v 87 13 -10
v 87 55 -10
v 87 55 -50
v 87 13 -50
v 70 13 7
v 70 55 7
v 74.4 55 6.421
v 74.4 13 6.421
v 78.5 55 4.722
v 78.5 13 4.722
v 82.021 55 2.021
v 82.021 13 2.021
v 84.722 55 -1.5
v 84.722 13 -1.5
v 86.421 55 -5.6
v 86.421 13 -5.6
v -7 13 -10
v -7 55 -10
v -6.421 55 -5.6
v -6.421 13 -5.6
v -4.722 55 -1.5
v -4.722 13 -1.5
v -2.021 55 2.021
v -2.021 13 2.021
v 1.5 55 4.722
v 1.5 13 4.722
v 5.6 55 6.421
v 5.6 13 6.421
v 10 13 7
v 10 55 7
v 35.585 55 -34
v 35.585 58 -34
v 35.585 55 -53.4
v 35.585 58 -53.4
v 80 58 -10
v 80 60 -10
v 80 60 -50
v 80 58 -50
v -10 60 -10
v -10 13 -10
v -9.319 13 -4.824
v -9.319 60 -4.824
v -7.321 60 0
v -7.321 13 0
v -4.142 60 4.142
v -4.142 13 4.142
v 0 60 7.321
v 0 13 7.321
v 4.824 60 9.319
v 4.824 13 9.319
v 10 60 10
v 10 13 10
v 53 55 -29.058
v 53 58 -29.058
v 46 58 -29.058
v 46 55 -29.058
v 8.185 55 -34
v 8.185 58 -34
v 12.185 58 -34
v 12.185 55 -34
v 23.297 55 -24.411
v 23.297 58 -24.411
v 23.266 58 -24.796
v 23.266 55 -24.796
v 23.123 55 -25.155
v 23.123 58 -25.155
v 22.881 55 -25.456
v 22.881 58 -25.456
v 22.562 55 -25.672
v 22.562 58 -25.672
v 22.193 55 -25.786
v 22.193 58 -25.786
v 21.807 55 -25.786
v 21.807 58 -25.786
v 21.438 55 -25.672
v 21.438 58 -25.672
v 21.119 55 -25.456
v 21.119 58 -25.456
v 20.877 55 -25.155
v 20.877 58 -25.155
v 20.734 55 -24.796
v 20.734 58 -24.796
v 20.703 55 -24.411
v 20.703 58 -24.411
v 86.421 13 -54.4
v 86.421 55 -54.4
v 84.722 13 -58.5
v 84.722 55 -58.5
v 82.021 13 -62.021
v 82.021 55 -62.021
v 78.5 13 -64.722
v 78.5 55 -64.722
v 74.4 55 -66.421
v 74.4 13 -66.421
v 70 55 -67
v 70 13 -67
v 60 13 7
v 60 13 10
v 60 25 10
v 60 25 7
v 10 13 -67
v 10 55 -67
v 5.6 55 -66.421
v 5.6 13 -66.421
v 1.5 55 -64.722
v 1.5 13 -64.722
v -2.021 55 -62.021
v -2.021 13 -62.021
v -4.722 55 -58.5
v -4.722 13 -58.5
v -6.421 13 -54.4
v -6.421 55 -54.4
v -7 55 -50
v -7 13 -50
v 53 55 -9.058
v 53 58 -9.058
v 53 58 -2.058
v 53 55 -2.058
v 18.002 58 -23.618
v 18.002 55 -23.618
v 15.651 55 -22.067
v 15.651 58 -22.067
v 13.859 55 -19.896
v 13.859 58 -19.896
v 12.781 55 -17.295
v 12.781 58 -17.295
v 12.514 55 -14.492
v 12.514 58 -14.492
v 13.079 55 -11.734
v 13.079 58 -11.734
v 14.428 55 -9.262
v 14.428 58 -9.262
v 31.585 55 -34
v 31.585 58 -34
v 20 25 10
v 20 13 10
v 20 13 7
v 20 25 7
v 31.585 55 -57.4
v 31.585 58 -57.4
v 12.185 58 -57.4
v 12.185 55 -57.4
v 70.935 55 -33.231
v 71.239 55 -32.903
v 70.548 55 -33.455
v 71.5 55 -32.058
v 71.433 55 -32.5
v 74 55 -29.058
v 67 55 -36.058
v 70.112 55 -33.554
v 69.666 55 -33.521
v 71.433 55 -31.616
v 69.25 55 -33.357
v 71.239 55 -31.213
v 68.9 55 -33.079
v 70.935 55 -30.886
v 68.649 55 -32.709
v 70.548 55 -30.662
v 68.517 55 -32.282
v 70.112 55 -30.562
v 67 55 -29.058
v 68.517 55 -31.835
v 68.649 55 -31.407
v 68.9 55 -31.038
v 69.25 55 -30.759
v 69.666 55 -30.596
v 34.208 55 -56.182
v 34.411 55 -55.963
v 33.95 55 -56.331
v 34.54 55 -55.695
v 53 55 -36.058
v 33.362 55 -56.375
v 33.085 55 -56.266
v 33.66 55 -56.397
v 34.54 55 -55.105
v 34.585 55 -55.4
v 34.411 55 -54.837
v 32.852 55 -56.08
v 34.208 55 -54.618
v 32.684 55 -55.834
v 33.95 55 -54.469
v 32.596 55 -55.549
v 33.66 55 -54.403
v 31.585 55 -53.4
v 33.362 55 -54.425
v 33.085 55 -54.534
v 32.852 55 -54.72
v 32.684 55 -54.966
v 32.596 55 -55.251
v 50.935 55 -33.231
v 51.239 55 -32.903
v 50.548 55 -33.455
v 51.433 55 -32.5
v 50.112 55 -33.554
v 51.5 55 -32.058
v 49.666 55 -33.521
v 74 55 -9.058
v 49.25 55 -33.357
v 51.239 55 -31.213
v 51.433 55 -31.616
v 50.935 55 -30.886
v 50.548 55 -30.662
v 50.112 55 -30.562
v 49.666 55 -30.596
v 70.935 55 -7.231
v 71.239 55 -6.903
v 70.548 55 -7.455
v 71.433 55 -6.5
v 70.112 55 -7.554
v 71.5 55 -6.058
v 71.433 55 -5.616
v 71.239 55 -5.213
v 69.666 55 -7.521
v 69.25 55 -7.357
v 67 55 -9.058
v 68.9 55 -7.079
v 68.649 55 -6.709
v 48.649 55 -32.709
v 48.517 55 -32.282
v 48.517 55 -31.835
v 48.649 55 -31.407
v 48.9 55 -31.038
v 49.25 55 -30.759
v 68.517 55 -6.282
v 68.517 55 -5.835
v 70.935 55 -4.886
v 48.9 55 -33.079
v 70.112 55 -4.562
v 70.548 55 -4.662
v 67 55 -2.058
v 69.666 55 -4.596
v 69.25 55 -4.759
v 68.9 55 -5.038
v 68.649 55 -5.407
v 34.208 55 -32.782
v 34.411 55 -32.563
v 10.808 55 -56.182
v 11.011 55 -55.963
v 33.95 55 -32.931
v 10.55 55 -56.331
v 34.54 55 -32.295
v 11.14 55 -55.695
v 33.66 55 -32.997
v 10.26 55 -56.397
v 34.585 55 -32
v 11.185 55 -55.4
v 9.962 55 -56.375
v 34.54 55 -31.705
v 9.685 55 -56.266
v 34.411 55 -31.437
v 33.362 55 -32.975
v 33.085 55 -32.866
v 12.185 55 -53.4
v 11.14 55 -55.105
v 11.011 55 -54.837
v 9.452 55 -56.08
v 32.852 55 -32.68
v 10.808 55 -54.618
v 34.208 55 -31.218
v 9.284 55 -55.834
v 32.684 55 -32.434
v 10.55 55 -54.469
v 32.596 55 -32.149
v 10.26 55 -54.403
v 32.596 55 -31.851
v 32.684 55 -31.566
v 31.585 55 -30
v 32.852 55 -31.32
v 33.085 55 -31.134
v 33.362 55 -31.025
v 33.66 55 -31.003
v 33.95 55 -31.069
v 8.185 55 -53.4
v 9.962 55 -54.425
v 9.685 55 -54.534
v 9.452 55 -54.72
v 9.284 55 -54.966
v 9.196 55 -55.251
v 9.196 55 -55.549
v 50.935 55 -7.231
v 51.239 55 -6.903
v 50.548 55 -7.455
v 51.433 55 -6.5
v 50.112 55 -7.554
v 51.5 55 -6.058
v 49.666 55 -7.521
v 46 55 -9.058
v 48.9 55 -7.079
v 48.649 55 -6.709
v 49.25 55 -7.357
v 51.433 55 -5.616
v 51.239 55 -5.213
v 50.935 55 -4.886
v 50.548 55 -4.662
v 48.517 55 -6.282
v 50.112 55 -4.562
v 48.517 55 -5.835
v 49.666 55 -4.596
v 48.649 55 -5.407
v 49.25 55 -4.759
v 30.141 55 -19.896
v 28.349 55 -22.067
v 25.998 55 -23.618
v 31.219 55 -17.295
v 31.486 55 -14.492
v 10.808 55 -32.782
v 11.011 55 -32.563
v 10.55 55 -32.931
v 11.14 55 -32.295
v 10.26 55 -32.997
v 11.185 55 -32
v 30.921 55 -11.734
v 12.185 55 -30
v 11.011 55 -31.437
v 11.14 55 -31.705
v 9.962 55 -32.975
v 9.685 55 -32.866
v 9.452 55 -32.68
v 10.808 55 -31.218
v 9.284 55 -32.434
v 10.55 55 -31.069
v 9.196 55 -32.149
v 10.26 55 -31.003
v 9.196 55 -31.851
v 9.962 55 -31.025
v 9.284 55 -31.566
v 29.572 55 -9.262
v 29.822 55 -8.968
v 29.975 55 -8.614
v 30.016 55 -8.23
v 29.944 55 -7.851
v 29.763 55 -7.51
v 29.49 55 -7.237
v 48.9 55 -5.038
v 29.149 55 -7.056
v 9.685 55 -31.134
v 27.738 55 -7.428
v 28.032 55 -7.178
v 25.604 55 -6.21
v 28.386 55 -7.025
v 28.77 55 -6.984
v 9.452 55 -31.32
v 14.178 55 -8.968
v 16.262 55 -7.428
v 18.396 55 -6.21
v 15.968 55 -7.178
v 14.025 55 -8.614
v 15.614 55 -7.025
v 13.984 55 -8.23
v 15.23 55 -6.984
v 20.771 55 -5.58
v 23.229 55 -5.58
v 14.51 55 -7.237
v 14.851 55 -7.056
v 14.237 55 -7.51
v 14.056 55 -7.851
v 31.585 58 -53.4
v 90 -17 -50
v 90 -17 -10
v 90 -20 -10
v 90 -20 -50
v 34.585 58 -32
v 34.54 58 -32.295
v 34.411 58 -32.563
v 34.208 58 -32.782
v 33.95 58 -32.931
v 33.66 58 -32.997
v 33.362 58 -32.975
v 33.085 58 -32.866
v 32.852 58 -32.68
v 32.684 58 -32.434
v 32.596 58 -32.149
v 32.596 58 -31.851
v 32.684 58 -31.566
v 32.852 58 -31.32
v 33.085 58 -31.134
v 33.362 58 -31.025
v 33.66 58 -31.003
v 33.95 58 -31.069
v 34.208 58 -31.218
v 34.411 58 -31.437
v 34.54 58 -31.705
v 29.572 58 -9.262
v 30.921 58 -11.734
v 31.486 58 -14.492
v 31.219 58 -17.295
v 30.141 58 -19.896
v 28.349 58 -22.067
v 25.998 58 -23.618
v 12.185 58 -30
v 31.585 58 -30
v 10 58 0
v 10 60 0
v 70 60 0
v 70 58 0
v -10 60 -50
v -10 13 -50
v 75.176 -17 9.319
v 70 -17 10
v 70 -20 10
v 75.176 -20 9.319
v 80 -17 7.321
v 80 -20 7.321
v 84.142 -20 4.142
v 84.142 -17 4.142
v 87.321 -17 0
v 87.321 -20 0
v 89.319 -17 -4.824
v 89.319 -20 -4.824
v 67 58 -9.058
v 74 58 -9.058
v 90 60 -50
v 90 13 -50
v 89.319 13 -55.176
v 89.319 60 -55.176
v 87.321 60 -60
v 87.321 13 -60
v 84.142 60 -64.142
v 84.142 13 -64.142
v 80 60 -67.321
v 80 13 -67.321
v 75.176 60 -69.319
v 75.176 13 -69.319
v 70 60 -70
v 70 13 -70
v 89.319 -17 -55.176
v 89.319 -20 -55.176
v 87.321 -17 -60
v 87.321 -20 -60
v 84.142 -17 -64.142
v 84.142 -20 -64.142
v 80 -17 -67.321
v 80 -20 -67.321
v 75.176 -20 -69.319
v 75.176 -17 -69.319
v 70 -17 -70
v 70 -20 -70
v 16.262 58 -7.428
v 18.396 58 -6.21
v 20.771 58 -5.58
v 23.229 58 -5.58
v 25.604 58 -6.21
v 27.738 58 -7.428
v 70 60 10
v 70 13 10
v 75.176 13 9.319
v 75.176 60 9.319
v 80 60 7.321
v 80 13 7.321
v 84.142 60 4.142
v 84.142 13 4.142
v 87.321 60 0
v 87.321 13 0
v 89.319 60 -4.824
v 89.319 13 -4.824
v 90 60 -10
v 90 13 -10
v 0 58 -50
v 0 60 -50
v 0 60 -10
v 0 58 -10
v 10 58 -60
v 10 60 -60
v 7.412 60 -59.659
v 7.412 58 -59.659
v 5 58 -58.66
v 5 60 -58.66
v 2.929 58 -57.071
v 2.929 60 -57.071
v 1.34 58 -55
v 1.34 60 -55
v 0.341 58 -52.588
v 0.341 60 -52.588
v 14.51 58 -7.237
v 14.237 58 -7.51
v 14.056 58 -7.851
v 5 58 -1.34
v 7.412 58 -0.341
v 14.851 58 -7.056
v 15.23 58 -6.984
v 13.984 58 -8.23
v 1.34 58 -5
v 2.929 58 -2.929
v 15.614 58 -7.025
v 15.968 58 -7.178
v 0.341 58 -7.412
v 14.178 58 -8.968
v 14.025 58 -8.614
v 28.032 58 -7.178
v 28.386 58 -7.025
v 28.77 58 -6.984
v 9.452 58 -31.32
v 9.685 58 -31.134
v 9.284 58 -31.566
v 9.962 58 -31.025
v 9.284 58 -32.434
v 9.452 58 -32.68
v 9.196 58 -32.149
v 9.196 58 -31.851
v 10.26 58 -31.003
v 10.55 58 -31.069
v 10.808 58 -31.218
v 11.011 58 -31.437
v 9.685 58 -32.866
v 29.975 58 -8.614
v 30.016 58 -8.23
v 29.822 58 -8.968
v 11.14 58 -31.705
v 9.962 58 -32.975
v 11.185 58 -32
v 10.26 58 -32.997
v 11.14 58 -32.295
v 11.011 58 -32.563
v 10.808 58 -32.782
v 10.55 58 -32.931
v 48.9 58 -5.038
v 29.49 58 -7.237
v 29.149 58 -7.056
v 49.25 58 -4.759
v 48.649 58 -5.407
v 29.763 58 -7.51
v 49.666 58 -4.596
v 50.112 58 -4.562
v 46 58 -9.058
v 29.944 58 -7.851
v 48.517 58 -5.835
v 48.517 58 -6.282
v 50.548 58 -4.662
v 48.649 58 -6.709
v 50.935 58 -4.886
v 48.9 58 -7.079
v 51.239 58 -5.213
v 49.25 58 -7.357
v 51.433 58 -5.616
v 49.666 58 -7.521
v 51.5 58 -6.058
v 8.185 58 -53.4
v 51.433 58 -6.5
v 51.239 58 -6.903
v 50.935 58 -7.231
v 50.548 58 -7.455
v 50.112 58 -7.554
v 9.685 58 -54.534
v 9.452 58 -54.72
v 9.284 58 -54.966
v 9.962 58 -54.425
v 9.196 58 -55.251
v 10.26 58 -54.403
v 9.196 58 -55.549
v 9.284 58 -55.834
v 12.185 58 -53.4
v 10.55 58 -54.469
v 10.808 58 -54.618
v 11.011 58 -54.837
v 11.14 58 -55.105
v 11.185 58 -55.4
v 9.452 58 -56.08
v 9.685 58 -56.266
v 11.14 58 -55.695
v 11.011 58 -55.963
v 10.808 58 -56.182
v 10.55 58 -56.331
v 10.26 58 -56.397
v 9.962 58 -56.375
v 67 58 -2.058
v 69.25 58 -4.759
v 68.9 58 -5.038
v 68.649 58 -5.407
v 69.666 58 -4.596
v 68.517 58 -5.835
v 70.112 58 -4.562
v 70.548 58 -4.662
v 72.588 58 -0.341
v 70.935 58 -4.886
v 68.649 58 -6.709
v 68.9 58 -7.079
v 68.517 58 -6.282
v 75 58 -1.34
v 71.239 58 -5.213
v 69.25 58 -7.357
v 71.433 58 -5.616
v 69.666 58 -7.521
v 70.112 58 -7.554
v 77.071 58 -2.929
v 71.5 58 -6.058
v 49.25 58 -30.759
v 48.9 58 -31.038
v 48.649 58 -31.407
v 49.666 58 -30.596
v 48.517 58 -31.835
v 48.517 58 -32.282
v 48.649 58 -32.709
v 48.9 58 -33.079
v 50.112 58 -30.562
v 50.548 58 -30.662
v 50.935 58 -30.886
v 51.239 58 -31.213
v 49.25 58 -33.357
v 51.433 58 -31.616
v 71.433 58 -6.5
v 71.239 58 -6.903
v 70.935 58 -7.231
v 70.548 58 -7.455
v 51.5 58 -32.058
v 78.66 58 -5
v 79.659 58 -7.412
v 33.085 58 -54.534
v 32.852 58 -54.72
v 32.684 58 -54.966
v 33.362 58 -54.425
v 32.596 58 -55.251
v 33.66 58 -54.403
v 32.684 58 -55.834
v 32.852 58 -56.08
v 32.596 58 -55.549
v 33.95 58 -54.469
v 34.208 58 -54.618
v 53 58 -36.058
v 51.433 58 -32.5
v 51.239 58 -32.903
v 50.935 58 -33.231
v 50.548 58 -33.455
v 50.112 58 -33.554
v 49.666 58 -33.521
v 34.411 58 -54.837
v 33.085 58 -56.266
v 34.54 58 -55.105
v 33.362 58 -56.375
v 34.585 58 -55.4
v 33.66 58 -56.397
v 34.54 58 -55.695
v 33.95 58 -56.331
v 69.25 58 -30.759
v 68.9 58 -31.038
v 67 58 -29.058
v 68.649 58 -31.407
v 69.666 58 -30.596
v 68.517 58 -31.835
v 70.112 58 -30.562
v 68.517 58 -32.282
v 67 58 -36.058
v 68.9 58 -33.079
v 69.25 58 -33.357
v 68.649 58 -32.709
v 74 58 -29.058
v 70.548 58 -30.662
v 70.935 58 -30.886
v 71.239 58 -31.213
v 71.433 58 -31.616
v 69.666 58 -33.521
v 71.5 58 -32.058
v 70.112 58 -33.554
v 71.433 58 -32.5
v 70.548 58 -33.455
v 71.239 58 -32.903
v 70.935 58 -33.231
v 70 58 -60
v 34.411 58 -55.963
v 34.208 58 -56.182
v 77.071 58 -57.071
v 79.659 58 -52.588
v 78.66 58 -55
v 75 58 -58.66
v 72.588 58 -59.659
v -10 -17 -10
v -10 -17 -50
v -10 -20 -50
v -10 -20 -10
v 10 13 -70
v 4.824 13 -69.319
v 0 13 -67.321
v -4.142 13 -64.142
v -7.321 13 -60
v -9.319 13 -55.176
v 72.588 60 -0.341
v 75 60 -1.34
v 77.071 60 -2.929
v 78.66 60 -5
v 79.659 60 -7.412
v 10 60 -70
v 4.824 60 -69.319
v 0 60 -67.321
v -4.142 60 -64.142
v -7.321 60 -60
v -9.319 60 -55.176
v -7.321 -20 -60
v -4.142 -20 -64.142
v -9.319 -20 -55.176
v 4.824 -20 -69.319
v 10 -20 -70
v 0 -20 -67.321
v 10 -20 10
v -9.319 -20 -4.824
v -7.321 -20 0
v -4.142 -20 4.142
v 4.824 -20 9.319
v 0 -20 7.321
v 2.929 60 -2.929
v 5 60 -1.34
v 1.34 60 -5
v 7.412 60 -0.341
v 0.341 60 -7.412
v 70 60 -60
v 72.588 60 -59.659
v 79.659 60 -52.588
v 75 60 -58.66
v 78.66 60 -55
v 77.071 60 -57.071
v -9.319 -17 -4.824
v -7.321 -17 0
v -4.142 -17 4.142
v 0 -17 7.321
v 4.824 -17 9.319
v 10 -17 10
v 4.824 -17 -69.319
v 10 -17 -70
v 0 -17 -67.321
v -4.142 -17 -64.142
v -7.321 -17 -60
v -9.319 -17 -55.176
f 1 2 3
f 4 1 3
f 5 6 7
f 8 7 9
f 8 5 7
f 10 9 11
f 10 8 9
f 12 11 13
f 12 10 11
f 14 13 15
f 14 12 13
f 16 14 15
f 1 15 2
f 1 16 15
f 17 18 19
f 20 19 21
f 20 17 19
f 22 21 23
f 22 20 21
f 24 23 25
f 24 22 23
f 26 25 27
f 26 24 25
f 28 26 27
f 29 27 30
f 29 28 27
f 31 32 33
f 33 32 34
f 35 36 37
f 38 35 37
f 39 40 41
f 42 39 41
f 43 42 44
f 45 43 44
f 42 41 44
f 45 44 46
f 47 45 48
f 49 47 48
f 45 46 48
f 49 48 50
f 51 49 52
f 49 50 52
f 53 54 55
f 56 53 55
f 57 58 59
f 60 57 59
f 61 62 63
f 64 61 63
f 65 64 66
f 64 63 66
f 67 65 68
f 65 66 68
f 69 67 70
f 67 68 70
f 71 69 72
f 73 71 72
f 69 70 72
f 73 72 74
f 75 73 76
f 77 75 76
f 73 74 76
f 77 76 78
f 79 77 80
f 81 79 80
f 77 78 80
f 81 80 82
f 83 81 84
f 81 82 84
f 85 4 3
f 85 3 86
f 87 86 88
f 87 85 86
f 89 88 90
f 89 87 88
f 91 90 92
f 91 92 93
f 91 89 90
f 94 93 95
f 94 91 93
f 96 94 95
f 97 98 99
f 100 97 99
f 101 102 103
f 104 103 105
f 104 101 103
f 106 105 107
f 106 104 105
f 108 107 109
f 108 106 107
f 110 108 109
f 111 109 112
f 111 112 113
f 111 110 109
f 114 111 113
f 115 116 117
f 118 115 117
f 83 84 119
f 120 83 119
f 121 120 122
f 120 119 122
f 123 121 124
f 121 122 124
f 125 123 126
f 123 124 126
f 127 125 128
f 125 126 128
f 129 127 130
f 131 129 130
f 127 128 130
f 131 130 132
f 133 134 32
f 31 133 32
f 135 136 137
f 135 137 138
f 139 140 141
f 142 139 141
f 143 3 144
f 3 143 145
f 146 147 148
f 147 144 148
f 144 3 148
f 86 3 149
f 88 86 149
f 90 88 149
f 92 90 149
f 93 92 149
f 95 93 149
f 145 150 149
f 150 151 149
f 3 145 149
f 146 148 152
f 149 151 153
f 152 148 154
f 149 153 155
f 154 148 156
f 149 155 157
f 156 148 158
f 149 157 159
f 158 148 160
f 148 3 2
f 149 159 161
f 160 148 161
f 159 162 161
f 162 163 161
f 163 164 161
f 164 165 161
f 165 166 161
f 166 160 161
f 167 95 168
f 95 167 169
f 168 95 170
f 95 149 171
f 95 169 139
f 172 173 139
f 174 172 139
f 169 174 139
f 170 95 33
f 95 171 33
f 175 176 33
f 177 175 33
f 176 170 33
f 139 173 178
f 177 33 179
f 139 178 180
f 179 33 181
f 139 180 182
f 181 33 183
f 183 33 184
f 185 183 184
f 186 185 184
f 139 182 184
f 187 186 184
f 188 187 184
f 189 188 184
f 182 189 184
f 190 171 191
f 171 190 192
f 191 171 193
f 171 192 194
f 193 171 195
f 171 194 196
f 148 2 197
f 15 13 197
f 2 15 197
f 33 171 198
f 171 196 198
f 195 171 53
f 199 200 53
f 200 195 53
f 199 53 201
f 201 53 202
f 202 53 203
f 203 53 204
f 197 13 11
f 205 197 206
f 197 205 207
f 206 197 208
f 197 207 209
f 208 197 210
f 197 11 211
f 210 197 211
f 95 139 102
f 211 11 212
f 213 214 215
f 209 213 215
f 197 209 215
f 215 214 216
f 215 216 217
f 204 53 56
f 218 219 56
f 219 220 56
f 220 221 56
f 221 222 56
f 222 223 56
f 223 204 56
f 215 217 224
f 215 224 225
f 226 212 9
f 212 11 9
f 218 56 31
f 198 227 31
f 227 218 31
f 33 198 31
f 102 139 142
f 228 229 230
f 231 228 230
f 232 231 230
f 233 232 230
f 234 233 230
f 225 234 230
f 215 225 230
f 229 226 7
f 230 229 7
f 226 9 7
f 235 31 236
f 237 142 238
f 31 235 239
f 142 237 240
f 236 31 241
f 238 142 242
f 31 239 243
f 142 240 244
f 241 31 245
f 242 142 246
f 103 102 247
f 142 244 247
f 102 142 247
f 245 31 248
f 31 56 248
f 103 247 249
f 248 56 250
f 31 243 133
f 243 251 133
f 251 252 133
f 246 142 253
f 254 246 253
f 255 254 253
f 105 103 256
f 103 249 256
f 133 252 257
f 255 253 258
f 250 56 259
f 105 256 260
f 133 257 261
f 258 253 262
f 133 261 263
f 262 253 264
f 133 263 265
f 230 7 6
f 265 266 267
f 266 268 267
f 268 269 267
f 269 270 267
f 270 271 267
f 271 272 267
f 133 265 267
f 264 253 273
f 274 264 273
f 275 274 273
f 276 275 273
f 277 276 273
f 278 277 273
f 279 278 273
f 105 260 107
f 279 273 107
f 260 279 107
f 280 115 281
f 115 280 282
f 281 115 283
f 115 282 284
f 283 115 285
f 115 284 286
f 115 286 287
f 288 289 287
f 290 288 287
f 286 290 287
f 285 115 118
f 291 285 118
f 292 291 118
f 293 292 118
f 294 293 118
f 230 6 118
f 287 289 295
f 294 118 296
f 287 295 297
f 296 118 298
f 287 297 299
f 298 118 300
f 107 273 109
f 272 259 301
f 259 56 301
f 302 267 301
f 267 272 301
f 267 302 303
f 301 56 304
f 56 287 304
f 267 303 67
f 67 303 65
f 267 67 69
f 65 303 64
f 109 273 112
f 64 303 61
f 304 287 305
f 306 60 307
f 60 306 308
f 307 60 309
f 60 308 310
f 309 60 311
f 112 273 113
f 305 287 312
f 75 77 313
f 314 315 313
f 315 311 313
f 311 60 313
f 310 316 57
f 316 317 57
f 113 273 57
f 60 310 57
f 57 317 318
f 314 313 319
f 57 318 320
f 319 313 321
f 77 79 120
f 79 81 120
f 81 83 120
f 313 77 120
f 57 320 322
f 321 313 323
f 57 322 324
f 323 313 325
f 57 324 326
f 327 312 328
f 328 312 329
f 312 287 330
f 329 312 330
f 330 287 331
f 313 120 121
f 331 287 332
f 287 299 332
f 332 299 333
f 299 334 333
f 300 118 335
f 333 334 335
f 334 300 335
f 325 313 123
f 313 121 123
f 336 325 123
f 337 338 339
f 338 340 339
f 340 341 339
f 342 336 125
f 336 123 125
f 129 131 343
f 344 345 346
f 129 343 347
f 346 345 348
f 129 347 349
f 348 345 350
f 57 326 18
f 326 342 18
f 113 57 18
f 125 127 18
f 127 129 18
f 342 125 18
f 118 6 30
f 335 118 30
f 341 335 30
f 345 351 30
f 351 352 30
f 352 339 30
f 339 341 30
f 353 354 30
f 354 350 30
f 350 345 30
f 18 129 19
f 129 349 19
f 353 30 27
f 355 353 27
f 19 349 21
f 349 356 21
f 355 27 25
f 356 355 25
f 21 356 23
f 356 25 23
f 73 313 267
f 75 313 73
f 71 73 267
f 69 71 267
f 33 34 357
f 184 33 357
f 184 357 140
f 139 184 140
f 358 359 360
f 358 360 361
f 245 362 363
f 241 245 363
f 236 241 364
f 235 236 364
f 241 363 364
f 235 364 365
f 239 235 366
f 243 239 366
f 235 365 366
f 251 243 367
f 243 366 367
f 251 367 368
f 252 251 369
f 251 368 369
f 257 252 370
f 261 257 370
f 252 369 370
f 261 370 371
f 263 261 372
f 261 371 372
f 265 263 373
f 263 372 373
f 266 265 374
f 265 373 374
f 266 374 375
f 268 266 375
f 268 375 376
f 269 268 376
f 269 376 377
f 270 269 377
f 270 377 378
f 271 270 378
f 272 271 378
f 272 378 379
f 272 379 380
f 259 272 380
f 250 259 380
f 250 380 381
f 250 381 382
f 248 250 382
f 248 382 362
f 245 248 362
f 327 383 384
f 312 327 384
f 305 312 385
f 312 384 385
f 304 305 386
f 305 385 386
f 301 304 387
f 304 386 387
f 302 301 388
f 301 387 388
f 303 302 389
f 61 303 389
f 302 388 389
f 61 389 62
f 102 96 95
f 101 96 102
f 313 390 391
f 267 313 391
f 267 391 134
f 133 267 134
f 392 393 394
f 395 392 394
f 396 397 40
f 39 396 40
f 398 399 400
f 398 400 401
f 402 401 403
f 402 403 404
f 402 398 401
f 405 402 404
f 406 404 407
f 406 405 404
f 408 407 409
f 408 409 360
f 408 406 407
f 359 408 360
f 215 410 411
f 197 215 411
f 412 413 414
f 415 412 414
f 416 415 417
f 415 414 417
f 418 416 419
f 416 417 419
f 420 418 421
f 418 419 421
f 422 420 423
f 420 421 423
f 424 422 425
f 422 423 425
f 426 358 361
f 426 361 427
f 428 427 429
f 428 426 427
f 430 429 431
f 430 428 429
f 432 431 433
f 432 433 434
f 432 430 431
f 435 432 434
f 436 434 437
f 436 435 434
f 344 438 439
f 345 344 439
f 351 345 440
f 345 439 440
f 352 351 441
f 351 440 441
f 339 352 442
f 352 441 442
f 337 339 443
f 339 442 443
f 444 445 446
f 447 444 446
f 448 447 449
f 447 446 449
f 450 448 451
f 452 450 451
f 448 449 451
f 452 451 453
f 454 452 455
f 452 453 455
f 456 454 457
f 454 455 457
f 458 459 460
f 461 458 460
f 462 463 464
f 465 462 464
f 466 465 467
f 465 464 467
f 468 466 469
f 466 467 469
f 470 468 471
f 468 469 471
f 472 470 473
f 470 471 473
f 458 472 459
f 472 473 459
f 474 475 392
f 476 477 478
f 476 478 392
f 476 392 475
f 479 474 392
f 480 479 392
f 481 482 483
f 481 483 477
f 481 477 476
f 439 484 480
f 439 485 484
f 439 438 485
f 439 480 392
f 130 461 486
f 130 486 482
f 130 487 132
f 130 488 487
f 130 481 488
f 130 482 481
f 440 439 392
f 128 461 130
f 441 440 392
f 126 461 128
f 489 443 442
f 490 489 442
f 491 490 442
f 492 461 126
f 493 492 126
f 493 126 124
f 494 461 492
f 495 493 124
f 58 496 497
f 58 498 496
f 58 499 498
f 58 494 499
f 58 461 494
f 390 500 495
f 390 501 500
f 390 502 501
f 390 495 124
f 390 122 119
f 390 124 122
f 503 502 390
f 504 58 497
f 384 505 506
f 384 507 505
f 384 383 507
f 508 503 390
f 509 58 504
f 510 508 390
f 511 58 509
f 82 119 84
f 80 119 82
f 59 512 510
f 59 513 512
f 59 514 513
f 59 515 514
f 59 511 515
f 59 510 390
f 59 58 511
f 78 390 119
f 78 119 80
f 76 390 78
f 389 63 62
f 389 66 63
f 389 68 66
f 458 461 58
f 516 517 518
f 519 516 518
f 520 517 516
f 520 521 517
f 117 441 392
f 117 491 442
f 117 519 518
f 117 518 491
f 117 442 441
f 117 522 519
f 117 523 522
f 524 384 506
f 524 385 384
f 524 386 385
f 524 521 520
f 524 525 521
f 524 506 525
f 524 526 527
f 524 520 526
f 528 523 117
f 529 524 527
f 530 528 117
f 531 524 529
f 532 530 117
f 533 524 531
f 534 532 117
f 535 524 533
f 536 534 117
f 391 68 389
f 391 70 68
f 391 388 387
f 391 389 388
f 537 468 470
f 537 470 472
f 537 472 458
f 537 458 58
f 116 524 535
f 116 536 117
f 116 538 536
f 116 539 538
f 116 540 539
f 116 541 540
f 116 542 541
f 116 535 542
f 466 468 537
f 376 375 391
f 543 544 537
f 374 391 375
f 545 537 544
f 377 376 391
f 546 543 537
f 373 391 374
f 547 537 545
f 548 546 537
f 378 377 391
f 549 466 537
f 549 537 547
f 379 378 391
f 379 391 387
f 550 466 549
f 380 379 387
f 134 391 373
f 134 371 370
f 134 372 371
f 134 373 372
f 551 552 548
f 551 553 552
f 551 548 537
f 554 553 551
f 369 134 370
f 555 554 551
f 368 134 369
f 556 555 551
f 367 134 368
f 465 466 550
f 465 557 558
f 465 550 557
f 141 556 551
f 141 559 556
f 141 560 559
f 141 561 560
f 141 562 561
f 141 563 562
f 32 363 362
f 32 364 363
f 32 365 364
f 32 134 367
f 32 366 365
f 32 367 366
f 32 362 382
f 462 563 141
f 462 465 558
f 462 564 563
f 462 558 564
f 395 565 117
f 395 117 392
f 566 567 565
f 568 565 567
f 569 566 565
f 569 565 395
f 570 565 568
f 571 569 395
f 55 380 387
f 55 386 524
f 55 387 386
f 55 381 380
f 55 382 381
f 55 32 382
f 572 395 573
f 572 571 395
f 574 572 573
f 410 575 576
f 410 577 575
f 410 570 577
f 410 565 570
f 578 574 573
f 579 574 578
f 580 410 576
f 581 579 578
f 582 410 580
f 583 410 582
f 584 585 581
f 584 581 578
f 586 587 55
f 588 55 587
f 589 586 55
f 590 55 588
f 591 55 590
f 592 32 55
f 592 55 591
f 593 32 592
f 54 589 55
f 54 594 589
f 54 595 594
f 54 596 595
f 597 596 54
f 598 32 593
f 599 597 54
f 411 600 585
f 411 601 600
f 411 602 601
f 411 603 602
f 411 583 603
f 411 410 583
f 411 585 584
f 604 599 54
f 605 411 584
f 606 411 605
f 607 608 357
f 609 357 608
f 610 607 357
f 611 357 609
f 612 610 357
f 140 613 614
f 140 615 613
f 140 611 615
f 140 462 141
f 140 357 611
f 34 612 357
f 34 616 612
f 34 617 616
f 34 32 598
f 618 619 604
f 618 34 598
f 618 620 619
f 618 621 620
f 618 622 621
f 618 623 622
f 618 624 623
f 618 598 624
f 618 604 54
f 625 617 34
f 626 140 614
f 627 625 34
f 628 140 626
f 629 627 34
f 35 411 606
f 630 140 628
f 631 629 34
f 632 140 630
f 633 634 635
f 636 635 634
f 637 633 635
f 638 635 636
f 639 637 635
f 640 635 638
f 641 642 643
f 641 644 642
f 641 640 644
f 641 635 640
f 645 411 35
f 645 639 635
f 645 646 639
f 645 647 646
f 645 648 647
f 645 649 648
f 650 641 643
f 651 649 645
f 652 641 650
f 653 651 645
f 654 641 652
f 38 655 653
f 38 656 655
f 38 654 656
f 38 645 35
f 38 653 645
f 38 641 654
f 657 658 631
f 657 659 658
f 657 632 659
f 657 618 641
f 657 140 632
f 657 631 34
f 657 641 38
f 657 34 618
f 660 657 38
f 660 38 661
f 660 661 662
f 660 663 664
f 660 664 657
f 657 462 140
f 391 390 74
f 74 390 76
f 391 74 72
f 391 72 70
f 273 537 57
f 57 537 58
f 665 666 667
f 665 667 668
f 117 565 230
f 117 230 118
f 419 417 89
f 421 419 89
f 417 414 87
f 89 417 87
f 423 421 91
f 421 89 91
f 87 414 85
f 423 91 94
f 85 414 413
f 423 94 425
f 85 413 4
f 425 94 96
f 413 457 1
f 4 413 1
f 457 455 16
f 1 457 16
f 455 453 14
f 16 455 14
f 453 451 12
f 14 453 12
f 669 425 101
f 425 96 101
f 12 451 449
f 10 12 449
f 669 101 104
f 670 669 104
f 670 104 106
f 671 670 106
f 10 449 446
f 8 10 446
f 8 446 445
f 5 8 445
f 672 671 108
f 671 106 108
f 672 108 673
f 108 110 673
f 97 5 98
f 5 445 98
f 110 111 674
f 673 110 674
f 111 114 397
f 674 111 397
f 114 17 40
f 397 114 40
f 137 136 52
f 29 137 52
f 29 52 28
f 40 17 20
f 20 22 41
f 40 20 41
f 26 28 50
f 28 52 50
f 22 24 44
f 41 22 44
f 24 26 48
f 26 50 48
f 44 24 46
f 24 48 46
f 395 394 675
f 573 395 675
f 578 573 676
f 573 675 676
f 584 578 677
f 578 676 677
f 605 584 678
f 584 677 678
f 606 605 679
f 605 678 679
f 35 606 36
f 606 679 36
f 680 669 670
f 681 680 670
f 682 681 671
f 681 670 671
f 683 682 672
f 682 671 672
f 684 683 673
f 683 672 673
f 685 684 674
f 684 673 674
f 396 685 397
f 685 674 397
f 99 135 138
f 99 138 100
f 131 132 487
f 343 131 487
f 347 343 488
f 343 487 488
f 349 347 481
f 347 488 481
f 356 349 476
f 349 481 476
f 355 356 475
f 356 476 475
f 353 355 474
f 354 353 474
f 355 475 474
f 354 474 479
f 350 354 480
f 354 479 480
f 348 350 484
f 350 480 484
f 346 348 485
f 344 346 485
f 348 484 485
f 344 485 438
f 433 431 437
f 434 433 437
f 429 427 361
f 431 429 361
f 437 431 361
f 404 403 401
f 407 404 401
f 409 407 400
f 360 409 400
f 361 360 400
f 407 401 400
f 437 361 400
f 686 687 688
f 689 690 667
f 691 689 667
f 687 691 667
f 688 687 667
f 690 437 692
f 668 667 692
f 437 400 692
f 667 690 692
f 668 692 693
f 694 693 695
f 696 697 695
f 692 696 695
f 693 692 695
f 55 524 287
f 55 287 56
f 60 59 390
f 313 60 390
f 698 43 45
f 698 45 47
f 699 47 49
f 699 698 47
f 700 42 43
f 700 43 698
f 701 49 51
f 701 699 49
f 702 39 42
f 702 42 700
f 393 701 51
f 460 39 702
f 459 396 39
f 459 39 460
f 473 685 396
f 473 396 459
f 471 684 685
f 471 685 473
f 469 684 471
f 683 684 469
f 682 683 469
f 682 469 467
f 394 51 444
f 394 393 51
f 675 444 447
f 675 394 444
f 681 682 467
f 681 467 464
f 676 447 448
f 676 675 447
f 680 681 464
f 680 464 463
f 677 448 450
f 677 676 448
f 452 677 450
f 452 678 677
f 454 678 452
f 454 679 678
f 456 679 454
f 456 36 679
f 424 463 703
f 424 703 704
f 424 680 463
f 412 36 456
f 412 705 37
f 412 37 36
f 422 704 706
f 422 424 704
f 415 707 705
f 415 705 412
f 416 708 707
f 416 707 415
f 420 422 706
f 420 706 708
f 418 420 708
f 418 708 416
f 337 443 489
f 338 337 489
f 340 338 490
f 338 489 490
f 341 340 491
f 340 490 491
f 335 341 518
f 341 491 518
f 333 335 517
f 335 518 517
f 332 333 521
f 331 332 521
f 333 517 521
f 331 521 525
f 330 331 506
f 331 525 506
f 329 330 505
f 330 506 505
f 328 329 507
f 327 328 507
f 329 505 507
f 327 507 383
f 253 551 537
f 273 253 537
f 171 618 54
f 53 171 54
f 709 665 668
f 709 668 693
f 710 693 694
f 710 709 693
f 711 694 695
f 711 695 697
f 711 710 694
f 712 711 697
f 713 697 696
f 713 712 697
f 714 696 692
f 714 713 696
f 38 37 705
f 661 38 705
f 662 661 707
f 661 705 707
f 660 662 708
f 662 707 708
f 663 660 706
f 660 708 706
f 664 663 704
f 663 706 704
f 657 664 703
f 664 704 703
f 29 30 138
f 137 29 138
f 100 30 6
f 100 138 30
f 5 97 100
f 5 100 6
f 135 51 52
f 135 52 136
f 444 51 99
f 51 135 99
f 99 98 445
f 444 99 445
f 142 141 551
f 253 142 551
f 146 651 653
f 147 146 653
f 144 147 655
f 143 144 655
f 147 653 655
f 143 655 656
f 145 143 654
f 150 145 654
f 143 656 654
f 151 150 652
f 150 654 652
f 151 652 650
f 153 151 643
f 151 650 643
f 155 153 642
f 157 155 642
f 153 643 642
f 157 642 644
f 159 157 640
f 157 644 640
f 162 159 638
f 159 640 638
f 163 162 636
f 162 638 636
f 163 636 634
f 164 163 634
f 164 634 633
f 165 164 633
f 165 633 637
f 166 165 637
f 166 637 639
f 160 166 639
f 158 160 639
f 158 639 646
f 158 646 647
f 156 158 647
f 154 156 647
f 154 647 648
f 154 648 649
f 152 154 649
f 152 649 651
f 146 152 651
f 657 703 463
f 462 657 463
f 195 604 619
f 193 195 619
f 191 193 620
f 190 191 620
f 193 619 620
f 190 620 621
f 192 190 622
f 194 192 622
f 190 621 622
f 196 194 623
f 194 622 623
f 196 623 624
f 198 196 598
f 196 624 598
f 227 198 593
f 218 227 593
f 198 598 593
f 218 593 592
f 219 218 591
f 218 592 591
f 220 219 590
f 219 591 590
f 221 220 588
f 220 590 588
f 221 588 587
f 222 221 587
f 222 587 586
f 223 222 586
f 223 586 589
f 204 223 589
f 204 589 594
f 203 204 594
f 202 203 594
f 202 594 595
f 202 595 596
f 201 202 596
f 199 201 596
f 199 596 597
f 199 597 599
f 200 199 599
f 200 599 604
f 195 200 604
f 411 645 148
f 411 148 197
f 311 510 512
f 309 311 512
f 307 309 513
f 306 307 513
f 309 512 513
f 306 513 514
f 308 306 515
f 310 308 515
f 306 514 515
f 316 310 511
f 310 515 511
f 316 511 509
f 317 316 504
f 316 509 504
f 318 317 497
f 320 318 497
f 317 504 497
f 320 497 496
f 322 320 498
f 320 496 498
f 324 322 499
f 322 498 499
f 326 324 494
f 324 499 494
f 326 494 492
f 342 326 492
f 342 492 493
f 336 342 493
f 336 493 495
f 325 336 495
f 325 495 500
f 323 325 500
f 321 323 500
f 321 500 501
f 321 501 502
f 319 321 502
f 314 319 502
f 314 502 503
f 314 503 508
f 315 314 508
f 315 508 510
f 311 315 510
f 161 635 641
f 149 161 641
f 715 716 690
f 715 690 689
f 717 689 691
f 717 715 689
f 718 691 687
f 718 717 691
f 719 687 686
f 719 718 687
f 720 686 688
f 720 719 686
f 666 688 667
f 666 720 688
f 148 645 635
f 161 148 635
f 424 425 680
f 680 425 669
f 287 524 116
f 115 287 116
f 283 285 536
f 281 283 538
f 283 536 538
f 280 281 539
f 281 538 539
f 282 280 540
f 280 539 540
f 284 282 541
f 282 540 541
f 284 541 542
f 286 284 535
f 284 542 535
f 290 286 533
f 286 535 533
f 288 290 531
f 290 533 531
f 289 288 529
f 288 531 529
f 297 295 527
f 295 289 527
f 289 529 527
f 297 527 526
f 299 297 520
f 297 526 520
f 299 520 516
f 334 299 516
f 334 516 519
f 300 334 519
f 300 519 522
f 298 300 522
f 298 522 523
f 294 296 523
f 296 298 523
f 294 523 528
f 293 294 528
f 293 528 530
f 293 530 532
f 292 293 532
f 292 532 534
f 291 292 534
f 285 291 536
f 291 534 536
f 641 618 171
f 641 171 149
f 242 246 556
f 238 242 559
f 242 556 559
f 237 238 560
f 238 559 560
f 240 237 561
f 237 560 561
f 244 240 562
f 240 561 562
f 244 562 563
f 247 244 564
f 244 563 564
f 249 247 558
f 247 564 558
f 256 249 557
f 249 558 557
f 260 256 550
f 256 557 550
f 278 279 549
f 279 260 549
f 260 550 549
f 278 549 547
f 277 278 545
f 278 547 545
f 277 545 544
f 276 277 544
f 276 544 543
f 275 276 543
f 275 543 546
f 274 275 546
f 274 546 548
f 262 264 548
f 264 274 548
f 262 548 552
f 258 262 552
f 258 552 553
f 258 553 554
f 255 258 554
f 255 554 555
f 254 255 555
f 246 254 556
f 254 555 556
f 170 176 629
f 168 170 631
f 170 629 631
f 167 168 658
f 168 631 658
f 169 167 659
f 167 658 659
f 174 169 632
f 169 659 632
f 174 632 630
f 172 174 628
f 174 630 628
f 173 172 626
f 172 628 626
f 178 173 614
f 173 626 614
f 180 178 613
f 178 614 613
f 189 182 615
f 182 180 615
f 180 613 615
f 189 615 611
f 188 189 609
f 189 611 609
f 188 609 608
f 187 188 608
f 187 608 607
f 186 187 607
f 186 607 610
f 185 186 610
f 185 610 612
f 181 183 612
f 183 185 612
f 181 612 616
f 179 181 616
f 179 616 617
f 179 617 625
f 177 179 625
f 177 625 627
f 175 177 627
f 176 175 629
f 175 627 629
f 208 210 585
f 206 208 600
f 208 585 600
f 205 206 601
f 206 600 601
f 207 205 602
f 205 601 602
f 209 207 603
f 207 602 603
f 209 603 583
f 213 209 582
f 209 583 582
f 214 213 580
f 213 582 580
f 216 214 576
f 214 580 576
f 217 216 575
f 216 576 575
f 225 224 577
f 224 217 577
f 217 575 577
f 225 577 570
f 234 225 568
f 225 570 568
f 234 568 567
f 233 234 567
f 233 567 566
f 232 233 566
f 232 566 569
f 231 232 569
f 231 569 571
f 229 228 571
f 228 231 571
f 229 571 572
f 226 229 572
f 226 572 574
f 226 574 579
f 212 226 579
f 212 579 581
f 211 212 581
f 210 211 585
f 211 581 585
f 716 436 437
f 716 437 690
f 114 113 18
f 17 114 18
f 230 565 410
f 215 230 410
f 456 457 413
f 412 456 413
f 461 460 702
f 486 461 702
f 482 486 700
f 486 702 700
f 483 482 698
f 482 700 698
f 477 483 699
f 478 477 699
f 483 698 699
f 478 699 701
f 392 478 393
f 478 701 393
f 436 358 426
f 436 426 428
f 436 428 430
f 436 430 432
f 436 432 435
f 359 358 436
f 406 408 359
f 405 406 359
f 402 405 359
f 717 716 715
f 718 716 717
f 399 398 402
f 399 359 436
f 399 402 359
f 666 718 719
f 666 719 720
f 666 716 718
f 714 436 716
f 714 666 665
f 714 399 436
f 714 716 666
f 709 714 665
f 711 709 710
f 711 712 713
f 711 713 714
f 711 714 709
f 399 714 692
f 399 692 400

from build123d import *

# Parameters (mm, degrees)
EXTRUDE_1_DEPTH       = 60
EXTRUDE_1_2_DEPTH     = 10
CUT_EXTRUDE_2_DEPTH   = 2
SKETCH_3_R            = 1.5
CUT_EXTRUDE_5_DEPTH   = 61
CUT_EXTRUDE_6_DEPTH   = 59
SKETCH_7_R            = 1
CUT_EXTRUDE_7_DEPTH   = 59
SKETCH_8_W            = 40
SKETCH_8_H            = 25
CUT_EXTRUDE_8_DEPTH   = 10
EXTRUDE_START         = 10
EXTRUDE_2_DEPTH       = 10
EXTRUDE_5_DEPTH       = 10
CUT_EXTRUDE_START     = -5
CUT_EXTRUDE_10_DEPTH  = 10
CUT_EXTRUDE_3_DEPTH   = 55
CUT_EXTRUDE_START_2   = 10
SKETCH_9_8_W          = 60
SKETCH_9_8_H          = 40
CUT_EXTRUDE_4_DEPTH   = 5
CUT_EXTRUDE_12_DEPTH  = 5
CUT_EXTRUDE_5_2_DEPTH = 55
CUT_EXTRUDE_6_2_DEPTH = 13
CUT_EXTRUDE_13_DEPTH  = 7
CUT_EXTRUDE_7_2_DEPTH = 17


with BuildPart() as part:
    # 草图1 → Extrude 1 (new body)
    with BuildSketch(Plane(origin=(0, 0, 0), x_dir=(1, 0, 0), z_dir=(0, 1, 0))):
        with BuildLine():
            Line((10, -10), (70, -10))
            ThreePointArc((70, -10), (84.142135624, -4.142135624), (90, 10))
            Line((90, 10), (90, 50))
            ThreePointArc((90, 50), (84.142135624, 64.142135624), (70, 70))
            Line((70, 70), (10, 70))
            ThreePointArc((10, 70), (-4.142135624, 64.142135624), (-10, 50))
            Line((-10, 50), (-10, 10))
            ThreePointArc((-10, 10), (-4.142135624, -4.142135624), (10, -10))
        make_face()
        with BuildLine():
            Line((10, 0), (70, 0))
            ThreePointArc((70, 0), (77.071067812, 2.928932188), (80, 10))
            Line((80, 10), (80, 50))
            ThreePointArc((80, 50), (77.071067812, 57.071067812), (70, 60))
            Line((70, 60), (10, 60))
            ThreePointArc((10, 60), (2.928932188, 57.071067812), (0, 50))
            Line((0, 50), (0, 10))
            ThreePointArc((0, 10), (2.928932188, 2.928932188), (10, 0))
        make_face(mode=Mode.SUBTRACT)
    extrude(amount=EXTRUDE_1_DEPTH)

    # 草图2 → Extrude 1 2 (add)
    with BuildSketch(Plane(origin=(0, 60, 0), x_dir=(1, 0, 0), z_dir=(0, 1, 0))):
        with BuildLine():
            Line((10, 0), (70, 0))
            ThreePointArc((70, 0), (77.071067812, 2.928932188), (80, 10))
            Line((80, 10), (80, 50))
            ThreePointArc((80, 50), (77.071067812, 57.071067812), (70, 60))
            Line((70, 60), (10, 60))
            ThreePointArc((10, 60), (2.928932188, 57.071067812), (0, 50))
            Line((0, 50), (0, 10))
            ThreePointArc((0, 10), (2.928932188, 2.928932188), (10, 0))
        make_face()
    extrude(amount=-EXTRUDE_1_2_DEPTH)

    # 草图2<6> → 切除-拉伸2 (cut)
    with BuildSketch(Plane(origin=(0, 60, 0), x_dir=(1, 0, 0), z_dir=(0, 1, 0))):
        with BuildLine():
            Line((10, 0), (70, 0))
            ThreePointArc((70, 0), (77.071067812, 2.928932188), (80, 10))
            Line((80, 10), (80, 50))
            ThreePointArc((80, 50), (77.071067812, 57.071067812), (70, 60))
            Line((70, 60), (10, 60))
            ThreePointArc((10, 60), (2.928932188, 57.071067812), (0, 50))
            Line((0, 50), (0, 10))
            ThreePointArc((0, 10), (2.928932188, 2.928932188), (10, 0))
        make_face()
    extrude(amount=-CUT_EXTRUDE_2_DEPTH, mode=Mode.SUBTRACT)

    # 草图3 → Cut-Extrude 5 (cut, through all)
    with BuildSketch(Plane(origin=(0, 60, 0), x_dir=(1, 0, 0), z_dir=(0, 1, 0))):
        with Locations((50, 6.058283931)):
            Circle(SKETCH_3_R)
        with Locations((70, 32.058283931)):
            Circle(SKETCH_3_R)
        with Locations((50, 32.058283931)):
            Circle(SKETCH_3_R)
        Polygon((53, 3.67004288), (53, 9.058283931), (51.136181137, 9.058283931), (46, 9.058283931), (46, 29.058283931), (51, 29.058283931), (53, 29.058283931), (53, 31), (53, 36.058283931), (67, 36.058283931), (67, 32.237823352), (67, 29.058283931), (71, 29.058283931), (74, 29.058283931), (74, 9.058283931), (71.136181137, 9.058283931), (67, 9.058283931), (67, 6.058283931), (67, 2.058283931), (53, 2.058283931), align=None)
        with Locations((70, 6.058283931)):
            Circle(SKETCH_3_R)
    extrude(amount=-CUT_EXTRUDE_5_DEPTH, mode=Mode.SUBTRACT)

    # 草图6 → Cut-Extrude 6 (cut, through all)
    with BuildSketch(Plane(origin=(0, 58, 0), x_dir=(1, 0, 0), z_dir=(0, 1, 0))):
        with BuildLine():
            ThreePointArc((23.296953494, 24.411052632), (22, 25.8), (20.703046506, 24.411052632))
            ThreePointArc((20.703046506, 24.411052632), (13.223144441, 18.635492607), (14.428296256, 9.262465477))
            ThreePointArc((14.428296256, 9.262465477), (14.363246763, 7.363246763), (16.262465477, 7.428296256))
            ThreePointArc((16.262465477, 7.428296256), (22, 5.5), (27.737534523, 7.428296256))
            ThreePointArc((27.737534523, 7.428296256), (29.636753237, 7.363246763), (29.571703744, 9.262465477))
            ThreePointArc((29.571703744, 9.262465477), (30.776855559, 18.635492607), (23.296953494, 24.411052632))
        make_face()
    extrude(amount=-CUT_EXTRUDE_6_DEPTH, mode=Mode.SUBTRACT)

    # 草图7 → Cut-Extrude 7 (cut, through all)
    with BuildSketch(Plane(origin=(0, 58, 0), x_dir=(1, 0, 0), z_dir=(0, 1, 0))):
        Polygon((31.584864034, 30), (31.584864034, 32), (31.584864034, 34), (35.584864034, 34), (35.584864034, 53.4), (31.584864034, 53.4), (31.584864034, 55.4), (31.584864034, 57.4), (12.184864034, 57.4), (12.184864034, 53.4), (10.184864034, 53.4), (8.184864034, 53.4), (8.184864034, 34), (12.184864034, 34), (12.184864034, 32), (12.184864034, 30), align=None)
        with Locations((33.584864034, 32)):
            Circle(SKETCH_7_R)
        with Locations((10.184864034, 55.4)):
            Circle(SKETCH_7_R)
        with Locations((33.584864034, 55.4)):
            Circle(SKETCH_7_R)
        with Locations((10.184864034, 32)):
            Circle(SKETCH_7_R)
    extrude(amount=-CUT_EXTRUDE_7_DEPTH, mode=Mode.SUBTRACT)

    # 草图8 → 切除-拉伸8 (cut)
    with BuildSketch(Plane.XY.offset(10)):
        with Locations((40, 12.5)):
            Rectangle(SKETCH_8_W, SKETCH_8_H)
    extrude(amount=-CUT_EXTRUDE_8_DEPTH, mode=Mode.SUBTRACT)

    # 草图2<8> → 切除-拉伸10 (cut)
    with BuildSketch(Plane(origin=(0, 60, 0), x_dir=(1, 0, 0), z_dir=(0, 1, 0)).offset(CUT_EXTRUDE_START)):
        with BuildLine():
            Line((10, 0), (70, 0))
            ThreePointArc((70, 0), (77.071067812, 2.928932188), (80, 10))
            Line((80, 10), (80, 50))
            ThreePointArc((80, 50), (77.071067812, 57.071067812), (70, 60))
            Line((70, 60), (10, 60))
            ThreePointArc((10, 60), (2.928932188, 57.071067812), (0, 50))
            Line((0, 50), (0, 10))
            ThreePointArc((0, 10), (2.928932188, 2.928932188), (10, 0))
        make_face()
    extrude(amount=-CUT_EXTRUDE_10_DEPTH, mode=Mode.SUBTRACT)

    # 草图9<7> → 切除-拉伸-薄壁3 (cut)
    with BuildSketch(Plane.XZ):
        with BuildLine():
            Line((85, -10), (85, -50))
            ThreePointArc((85, -50), (80.606601718, -60.606601718), (70, -65))
            Line((70, -65), (10, -65))
            ThreePointArc((10, -65), (-0.606601718, -60.606601718), (-5, -50))
            Line((-5, -50), (-5, -10))
            ThreePointArc((-5, -10), (-0.606601718, 0.606601718), (10, 5))
            Line((10, 5), (70, 5))
            ThreePointArc((70, 5), (80.606601718, 0.606601718), (85, -10))
        make_face()
        with BuildLine():
            Line((75, -10), (75, -50))
            ThreePointArc((75, -50), (73.535533906, -53.535533906), (70, -55))
            Line((70, -55), (10, -55))
            ThreePointArc((10, -55), (6.464466094, -53.535533906), (5, -50))
            Line((5, -50), (5, -10))
            ThreePointArc((5, -10), (6.464466094, -6.464466094), (10, -5))
            Line((10, -5), (70, -5))
            ThreePointArc((70, -5), (73.535533906, -6.464466094), (75, -10))
        make_face(mode=Mode.SUBTRACT)
    extrude(amount=-CUT_EXTRUDE_3_DEPTH, mode=Mode.SUBTRACT)

    # 草图9<10> → Cut-Extrude 5 2 (cut)
    with BuildSketch(Plane.XZ):
        with BuildLine():
            Line((87, -10), (87, -50))
            ThreePointArc((87, -50), (82.02081528, -62.02081528), (70, -67))
            Line((70, -67), (10, -67))
            ThreePointArc((10, -67), (-2.02081528, -62.02081528), (-7, -50))
            Line((-7, -50), (-7, -10))
            ThreePointArc((-7, -10), (-2.02081528, 2.02081528), (10, 7))
            Line((10, 7), (70, 7))
            ThreePointArc((70, 7), (82.02081528, 2.02081528), (87, -10))
        make_face()
        with BuildLine():
            Line((80, -10), (80, -50))
            ThreePointArc((80, -50), (77.071067812, -57.071067812), (70, -60))
            Line((70, -60), (10, -60))
            ThreePointArc((10, -60), (2.928932188, -57.071067812), (0, -50))
            Line((0, -50), (0, -10))
            ThreePointArc((0, -10), (2.928932188, -2.928932188), (10, 0))
            Line((10, 0), (70, 0))
            ThreePointArc((70, 0), (77.071067812, -2.928932188), (80, -10))
        make_face(mode=Mode.SUBTRACT)
    extrude(amount=-CUT_EXTRUDE_5_2_DEPTH, mode=Mode.SUBTRACT)

    # 草图9<11> → Cut-Extrude 6 2 (cut)
    with BuildSketch(Plane.XZ):
        with BuildLine():
            Line((90, -10), (90, -50))
            ThreePointArc((90, -50), (84.142135624, -64.142135624), (70, -70))
            Line((70, -70), (10, -70))
            ThreePointArc((10, -70), (-4.142135624, -64.142135624), (-10, -50))
            Line((-10, -50), (-10, -10))
            ThreePointArc((-10, -10), (-4.142135624, 4.142135624), (10, 10))
            Line((10, 10), (70, 10))
            ThreePointArc((70, 10), (84.142135624, 4.142135624), (90, -10))
        make_face()
        with BuildLine():
            Line((80, -10), (80, -50))
            ThreePointArc((80, -50), (77.071067812, -57.071067812), (70, -60))
            Line((70, -60), (10, -60))
            ThreePointArc((10, -60), (2.928932188, -57.071067812), (0, -50))
            Line((0, -50), (0, -10))
            ThreePointArc((0, -10), (2.928932188, -2.928932188), (10, 0))
            Line((10, 0), (70, 0))
            ThreePointArc((70, 0), (77.071067812, -2.928932188), (80, -10))
        make_face(mode=Mode.SUBTRACT)
    extrude(amount=-CUT_EXTRUDE_6_2_DEPTH, mode=Mode.SUBTRACT)


with BuildPart() as body_2:
    # 草图9 → 凸台-拉伸2 (new body)
    with BuildSketch(Plane.XZ.offset(EXTRUDE_START)):
        with BuildLine():
            Line((10, 0), (70, 0))
            ThreePointArc((70, 0), (77.071067812, -2.928932188), (80, -10))
            Line((80, -10), (80, -50))
            ThreePointArc((80, -50), (77.071067812, -57.071067812), (70, -60))
            Line((70, -60), (10, -60))
            ThreePointArc((10, -60), (2.928932188, -57.071067812), (0, -50))
            Line((0, -50), (0, -10))
            ThreePointArc((0, -10), (2.928932188, -2.928932188), (10, 0))
        make_face()
    extrude(amount=EXTRUDE_2_DEPTH)

    # 草图10 → 拉伸-薄壁5 (add)
    with BuildSketch(Plane.XZ.offset(EXTRUDE_START)):
        with BuildLine():
            Line((10, 10), (70, 10))
            ThreePointArc((70, 10), (84.142135624, 4.142135624), (90, -10))
            Line((90, -10), (90, -50))
            ThreePointArc((90, -50), (84.142135624, -64.142135624), (70, -70))
            Line((70, -70), (10, -70))
            ThreePointArc((10, -70), (-4.142135624, -64.142135624), (-10, -50))
            Line((-10, -50), (-10, -10))
            ThreePointArc((-10, -10), (-4.142135624, 4.142135624), (10, 10))
        make_face()
        with BuildLine():
            Line((10, 0), (70, 0))
            ThreePointArc((70, 0), (77.071067812, -2.928932188), (80, -10))
            Line((80, -10), (80, -50))
            ThreePointArc((80, -50), (77.071067812, -57.071067812), (70, -60))
            Line((70, -60), (10, -60))
            ThreePointArc((10, -60), (2.928932188, -57.071067812), (0, -50))
            Line((0, -50), (0, -10))
            ThreePointArc((0, -10), (2.928932188, -2.928932188), (10, 0))
        make_face(mode=Mode.SUBTRACT)
    extrude(amount=EXTRUDE_5_DEPTH)

    # 草图9<8> → 切除-拉伸-薄壁4 (cut)
    with BuildSketch(Plane.XZ.offset(CUT_EXTRUDE_START_2)):
        with BuildLine():
            Line((90, -10), (90, -50))
            ThreePointArc((90, -50), (84.142135624, -64.142135624), (70, -70))
            Line((70, -70), (10, -70))
            ThreePointArc((10, -70), (-4.142135624, -64.142135624), (-10, -50))
            Line((-10, -50), (-10, -10))
            ThreePointArc((-10, -10), (-4.142135624, 4.142135624), (10, 10))
            Line((10, 10), (70, 10))
            ThreePointArc((70, 10), (84.142135624, 4.142135624), (90, -10))
        make_face()
        with Locations((40, -30)):
            Rectangle(SKETCH_9_8_W, SKETCH_9_8_H, mode=Mode.SUBTRACT)
    extrude(amount=CUT_EXTRUDE_4_DEPTH, mode=Mode.SUBTRACT)

    # 草图9<9> → 切除-拉伸12 (cut)
    with BuildSketch(Plane.XZ.offset(CUT_EXTRUDE_START_2)):
        with BuildLine():
            Line((10, 0), (70, 0))
            ThreePointArc((70, 0), (77.071067812, -2.928932188), (80, -10))
            Line((80, -10), (80, -50))
            ThreePointArc((80, -50), (77.071067812, -57.071067812), (70, -60))
            Line((70, -60), (10, -60))
            ThreePointArc((10, -60), (2.928932188, -57.071067812), (0, -50))
            Line((0, -50), (0, -10))
            ThreePointArc((0, -10), (2.928932188, -2.928932188), (10, 0))
        make_face()
    extrude(amount=CUT_EXTRUDE_12_DEPTH, mode=Mode.SUBTRACT)

    # 草图9<12> → 切除-拉伸13 (cut)
    with BuildSketch(Plane.XZ.offset(CUT_EXTRUDE_START_2)):
        with BuildLine():
            Line((10, 0), (70, 0))
            ThreePointArc((70, 0), (77.071067812, -2.928932188), (80, -10))
            Line((80, -10), (80, -50))
            ThreePointArc((80, -50), (77.071067812, -57.071067812), (70, -60))
            Line((70, -60), (10, -60))
            ThreePointArc((10, -60), (2.928932188, -57.071067812), (0, -50))
            Line((0, -50), (0, -10))
            ThreePointArc((0, -10), (2.928932188, -2.928932188), (10, 0))
        make_face()
    extrude(amount=CUT_EXTRUDE_13_DEPTH, mode=Mode.SUBTRACT)

    # 草图9<13> → Cut-Extrude 7 2 (cut)
    with BuildSketch(Plane.XZ):
        with BuildLine():
            Line((90, -10), (90, -50))
            ThreePointArc((90, -50), (84.142135624, -64.142135624), (70, -70))
            Line((70, -70), (10, -70))
            ThreePointArc((10, -70), (-4.142135624, -64.142135624), (-10, -50))
            Line((-10, -50), (-10, -10))
            ThreePointArc((-10, -10), (-4.142135624, 4.142135624), (10, 10))
            Line((10, 10), (70, 10))
            ThreePointArc((70, 10), (84.142135624, 4.142135624), (90, -10))
        make_face()
        with BuildLine():
            Line((80, -10), (80, -50))
            ThreePointArc((80, -50), (77.071067812, -57.071067812), (70, -60))
            Line((70, -60), (10, -60))
            ThreePointArc((10, -60), (2.928932188, -57.071067812), (0, -50))
            Line((0, -50), (0, -10))
            ThreePointArc((0, -10), (2.928932188, -2.928932188), (10, 0))
            Line((10, 0), (70, 0))
            ThreePointArc((70, 0), (77.071067812, -2.928932188), (80, -10))
        make_face(mode=Mode.SUBTRACT)
    extrude(amount=CUT_EXTRUDE_7_2_DEPTH, mode=Mode.SUBTRACT)


solid = Compound([part.part, body_2.part])
